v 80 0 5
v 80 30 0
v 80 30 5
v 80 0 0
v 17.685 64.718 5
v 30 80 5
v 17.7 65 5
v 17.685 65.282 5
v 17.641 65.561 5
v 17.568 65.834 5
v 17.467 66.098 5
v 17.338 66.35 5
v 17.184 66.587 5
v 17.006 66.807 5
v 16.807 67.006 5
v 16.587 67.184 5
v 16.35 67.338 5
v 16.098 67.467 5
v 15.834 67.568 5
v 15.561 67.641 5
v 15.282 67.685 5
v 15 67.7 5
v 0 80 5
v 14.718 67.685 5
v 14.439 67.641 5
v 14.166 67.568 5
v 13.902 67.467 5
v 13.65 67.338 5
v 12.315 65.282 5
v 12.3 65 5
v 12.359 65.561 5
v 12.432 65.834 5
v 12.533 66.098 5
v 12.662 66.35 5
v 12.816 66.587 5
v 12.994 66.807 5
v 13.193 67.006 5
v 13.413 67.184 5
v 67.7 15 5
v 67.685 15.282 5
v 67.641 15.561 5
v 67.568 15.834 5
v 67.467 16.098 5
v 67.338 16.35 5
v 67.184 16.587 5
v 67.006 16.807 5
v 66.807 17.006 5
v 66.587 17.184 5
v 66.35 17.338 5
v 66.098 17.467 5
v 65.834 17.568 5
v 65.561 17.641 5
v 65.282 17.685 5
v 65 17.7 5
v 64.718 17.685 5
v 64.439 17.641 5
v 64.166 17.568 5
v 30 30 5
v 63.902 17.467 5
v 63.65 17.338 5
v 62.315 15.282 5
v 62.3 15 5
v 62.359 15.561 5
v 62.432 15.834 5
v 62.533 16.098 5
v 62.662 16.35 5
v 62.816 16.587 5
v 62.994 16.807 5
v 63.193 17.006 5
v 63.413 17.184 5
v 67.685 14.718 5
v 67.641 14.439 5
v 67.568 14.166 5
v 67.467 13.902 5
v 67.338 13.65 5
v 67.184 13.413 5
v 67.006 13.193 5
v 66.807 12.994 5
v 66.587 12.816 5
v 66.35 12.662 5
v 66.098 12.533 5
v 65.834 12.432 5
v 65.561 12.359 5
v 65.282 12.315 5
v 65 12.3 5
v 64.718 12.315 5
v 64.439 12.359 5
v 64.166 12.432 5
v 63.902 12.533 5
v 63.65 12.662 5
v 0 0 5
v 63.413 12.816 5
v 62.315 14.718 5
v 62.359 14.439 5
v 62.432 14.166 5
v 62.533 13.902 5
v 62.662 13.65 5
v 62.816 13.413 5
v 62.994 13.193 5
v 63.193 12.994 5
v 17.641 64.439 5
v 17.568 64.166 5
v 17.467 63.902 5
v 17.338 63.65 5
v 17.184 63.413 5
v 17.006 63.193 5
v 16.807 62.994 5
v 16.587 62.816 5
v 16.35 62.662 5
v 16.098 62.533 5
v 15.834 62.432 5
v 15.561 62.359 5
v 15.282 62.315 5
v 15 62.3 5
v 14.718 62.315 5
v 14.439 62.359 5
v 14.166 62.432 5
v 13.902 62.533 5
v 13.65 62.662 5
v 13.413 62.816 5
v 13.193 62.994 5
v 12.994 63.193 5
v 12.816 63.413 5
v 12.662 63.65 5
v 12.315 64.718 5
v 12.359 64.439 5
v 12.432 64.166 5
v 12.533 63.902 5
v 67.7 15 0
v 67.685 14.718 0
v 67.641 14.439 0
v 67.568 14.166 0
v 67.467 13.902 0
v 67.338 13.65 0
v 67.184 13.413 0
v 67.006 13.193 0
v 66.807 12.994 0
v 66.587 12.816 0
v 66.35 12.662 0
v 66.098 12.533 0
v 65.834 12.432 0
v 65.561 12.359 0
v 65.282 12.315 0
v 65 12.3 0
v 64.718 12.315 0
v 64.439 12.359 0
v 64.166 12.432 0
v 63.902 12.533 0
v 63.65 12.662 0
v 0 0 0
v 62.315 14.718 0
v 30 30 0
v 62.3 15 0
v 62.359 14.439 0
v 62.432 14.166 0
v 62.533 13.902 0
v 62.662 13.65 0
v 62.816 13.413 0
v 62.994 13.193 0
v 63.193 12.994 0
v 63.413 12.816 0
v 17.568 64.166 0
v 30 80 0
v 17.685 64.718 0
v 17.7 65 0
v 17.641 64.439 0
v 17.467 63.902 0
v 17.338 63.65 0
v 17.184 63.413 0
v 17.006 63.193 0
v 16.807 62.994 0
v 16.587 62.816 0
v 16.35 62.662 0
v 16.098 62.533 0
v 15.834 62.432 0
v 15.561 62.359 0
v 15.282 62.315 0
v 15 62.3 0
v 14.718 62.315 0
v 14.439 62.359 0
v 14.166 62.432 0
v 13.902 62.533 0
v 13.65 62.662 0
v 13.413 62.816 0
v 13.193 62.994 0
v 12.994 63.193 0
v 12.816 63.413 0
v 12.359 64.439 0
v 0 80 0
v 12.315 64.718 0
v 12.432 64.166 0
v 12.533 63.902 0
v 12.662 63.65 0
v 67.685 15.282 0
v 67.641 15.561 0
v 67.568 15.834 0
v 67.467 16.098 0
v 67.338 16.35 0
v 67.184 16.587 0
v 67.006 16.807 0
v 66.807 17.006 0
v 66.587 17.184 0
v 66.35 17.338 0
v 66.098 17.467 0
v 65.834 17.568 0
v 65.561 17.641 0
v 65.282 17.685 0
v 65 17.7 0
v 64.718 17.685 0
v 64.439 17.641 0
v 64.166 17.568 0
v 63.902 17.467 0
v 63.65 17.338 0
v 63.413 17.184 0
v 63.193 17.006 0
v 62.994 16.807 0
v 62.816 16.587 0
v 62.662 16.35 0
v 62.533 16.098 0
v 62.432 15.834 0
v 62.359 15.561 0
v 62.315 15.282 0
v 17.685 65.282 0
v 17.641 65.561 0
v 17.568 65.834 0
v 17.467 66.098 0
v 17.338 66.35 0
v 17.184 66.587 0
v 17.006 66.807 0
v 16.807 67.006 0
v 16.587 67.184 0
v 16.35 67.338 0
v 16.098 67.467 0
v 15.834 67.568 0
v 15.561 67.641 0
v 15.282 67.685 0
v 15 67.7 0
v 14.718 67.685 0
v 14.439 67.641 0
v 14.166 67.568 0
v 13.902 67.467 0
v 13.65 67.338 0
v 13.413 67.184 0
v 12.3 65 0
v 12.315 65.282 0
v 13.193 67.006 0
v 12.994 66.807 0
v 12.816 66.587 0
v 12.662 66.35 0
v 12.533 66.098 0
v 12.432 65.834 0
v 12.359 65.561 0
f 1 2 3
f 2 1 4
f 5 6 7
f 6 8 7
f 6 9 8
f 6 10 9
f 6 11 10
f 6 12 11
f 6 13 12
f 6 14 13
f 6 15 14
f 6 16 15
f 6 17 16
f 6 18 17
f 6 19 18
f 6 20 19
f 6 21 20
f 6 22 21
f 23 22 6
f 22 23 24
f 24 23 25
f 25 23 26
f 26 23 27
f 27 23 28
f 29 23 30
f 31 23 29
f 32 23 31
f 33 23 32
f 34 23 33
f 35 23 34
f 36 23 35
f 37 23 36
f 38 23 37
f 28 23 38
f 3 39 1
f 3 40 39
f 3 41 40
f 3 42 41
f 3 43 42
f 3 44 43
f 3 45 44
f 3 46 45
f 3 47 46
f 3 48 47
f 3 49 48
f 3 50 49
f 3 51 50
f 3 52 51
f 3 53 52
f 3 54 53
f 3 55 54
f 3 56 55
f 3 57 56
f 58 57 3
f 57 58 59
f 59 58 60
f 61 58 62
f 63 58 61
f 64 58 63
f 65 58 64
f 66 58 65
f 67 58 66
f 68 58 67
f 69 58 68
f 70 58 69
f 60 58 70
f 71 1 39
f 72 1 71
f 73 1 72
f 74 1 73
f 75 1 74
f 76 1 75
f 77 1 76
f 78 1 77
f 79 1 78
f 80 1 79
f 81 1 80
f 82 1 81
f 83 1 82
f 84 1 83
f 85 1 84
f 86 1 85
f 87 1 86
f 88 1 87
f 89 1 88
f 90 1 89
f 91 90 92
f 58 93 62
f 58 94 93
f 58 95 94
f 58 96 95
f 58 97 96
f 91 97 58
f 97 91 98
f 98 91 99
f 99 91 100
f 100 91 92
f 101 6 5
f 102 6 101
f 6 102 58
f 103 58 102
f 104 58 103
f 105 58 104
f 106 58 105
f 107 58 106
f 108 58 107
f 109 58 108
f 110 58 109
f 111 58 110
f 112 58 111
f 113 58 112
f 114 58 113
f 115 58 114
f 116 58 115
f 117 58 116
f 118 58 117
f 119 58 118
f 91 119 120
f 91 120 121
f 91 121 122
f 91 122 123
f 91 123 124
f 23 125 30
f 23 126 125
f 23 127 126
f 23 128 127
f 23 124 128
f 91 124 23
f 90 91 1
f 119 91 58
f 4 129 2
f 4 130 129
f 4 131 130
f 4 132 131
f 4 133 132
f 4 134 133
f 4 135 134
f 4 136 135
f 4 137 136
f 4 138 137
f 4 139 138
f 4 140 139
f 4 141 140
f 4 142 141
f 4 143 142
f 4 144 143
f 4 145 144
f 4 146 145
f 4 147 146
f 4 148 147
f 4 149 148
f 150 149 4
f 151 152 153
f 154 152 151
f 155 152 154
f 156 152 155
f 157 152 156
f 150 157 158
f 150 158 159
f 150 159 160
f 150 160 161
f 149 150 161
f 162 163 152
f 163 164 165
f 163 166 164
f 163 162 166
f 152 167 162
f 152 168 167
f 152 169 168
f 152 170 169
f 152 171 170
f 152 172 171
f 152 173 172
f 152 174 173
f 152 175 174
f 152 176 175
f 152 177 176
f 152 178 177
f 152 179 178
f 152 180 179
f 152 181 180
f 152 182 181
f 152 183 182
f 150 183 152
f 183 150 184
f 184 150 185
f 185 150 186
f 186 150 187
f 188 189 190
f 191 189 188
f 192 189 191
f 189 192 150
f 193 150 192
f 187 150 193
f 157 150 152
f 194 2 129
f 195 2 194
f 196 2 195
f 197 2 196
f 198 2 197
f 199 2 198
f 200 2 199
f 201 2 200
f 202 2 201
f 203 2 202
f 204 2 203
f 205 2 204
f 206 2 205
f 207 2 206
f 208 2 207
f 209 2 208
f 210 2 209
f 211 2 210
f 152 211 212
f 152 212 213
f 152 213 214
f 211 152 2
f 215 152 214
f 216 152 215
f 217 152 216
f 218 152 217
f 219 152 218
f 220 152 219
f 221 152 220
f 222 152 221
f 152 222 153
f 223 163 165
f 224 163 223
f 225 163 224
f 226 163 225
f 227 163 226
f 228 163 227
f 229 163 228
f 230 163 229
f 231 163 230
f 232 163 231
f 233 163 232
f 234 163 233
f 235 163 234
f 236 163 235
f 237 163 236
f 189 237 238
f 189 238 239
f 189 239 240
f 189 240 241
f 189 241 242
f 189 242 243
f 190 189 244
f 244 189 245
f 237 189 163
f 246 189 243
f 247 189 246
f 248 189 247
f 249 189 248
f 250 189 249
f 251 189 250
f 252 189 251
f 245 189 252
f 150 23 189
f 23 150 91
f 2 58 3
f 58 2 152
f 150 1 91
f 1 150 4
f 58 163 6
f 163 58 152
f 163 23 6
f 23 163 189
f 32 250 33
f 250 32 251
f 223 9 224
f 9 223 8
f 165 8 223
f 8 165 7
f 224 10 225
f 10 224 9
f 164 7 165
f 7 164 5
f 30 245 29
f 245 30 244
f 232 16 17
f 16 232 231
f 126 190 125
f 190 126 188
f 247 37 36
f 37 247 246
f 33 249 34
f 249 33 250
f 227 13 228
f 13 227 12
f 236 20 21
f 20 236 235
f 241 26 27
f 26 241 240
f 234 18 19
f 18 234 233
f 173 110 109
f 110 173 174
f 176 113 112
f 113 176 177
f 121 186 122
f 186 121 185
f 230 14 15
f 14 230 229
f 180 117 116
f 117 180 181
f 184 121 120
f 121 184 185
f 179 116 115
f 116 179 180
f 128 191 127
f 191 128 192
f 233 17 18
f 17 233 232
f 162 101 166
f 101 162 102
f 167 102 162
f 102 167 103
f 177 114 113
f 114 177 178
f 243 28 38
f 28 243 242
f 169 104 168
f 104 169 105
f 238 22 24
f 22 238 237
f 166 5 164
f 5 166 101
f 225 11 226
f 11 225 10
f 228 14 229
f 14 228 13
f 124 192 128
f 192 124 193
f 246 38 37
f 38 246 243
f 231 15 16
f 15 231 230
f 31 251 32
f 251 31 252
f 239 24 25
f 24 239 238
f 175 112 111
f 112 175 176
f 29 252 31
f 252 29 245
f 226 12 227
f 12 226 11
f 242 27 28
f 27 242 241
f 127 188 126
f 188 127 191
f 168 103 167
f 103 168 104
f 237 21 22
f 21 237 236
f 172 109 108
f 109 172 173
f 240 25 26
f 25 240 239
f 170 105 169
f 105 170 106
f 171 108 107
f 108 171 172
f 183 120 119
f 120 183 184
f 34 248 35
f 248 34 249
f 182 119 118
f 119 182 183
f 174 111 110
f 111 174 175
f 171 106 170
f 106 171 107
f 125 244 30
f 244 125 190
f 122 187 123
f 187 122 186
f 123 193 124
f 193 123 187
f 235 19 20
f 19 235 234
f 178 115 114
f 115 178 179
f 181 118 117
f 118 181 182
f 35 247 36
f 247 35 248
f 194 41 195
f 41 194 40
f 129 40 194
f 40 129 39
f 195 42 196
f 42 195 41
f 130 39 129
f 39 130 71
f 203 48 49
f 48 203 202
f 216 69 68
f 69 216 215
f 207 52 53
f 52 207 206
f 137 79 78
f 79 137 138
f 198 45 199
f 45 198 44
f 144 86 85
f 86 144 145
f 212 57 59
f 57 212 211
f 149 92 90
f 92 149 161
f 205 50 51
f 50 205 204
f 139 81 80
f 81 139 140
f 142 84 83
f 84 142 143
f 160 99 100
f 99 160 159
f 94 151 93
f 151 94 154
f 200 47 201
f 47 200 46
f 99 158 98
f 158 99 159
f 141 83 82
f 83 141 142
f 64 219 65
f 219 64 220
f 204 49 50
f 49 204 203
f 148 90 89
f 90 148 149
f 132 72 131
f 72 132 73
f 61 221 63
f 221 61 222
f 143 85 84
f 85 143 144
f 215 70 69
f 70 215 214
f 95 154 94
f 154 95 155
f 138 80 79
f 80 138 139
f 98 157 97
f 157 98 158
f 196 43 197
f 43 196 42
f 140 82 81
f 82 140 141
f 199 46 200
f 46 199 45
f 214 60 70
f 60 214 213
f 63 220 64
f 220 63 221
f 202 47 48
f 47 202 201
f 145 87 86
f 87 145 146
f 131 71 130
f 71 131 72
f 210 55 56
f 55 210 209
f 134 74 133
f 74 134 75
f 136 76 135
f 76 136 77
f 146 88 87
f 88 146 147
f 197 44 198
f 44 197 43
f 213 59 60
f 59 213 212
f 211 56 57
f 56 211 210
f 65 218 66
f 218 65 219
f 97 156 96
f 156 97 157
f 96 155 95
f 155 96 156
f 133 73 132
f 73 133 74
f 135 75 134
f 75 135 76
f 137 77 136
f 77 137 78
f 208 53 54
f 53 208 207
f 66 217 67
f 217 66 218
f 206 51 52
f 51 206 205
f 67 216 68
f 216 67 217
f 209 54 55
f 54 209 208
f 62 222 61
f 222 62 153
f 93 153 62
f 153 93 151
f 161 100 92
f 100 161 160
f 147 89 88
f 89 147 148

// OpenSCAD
// Flat 90-degree corner plate.
$fn = 60;
eps = 0.02;
arm = 80;
width = 30;
plate_t = 5;
difference() {
    union() { cube([arm, width, plate_t]); cube([width, arm, plate_t]); }
    for (p = [[width / 2, arm - width / 2], [arm - width / 2, width / 2]])
        translate([p[0], p[1], -eps]) cylinder(d = 5.4, h = plate_t + 2 * eps);
}
